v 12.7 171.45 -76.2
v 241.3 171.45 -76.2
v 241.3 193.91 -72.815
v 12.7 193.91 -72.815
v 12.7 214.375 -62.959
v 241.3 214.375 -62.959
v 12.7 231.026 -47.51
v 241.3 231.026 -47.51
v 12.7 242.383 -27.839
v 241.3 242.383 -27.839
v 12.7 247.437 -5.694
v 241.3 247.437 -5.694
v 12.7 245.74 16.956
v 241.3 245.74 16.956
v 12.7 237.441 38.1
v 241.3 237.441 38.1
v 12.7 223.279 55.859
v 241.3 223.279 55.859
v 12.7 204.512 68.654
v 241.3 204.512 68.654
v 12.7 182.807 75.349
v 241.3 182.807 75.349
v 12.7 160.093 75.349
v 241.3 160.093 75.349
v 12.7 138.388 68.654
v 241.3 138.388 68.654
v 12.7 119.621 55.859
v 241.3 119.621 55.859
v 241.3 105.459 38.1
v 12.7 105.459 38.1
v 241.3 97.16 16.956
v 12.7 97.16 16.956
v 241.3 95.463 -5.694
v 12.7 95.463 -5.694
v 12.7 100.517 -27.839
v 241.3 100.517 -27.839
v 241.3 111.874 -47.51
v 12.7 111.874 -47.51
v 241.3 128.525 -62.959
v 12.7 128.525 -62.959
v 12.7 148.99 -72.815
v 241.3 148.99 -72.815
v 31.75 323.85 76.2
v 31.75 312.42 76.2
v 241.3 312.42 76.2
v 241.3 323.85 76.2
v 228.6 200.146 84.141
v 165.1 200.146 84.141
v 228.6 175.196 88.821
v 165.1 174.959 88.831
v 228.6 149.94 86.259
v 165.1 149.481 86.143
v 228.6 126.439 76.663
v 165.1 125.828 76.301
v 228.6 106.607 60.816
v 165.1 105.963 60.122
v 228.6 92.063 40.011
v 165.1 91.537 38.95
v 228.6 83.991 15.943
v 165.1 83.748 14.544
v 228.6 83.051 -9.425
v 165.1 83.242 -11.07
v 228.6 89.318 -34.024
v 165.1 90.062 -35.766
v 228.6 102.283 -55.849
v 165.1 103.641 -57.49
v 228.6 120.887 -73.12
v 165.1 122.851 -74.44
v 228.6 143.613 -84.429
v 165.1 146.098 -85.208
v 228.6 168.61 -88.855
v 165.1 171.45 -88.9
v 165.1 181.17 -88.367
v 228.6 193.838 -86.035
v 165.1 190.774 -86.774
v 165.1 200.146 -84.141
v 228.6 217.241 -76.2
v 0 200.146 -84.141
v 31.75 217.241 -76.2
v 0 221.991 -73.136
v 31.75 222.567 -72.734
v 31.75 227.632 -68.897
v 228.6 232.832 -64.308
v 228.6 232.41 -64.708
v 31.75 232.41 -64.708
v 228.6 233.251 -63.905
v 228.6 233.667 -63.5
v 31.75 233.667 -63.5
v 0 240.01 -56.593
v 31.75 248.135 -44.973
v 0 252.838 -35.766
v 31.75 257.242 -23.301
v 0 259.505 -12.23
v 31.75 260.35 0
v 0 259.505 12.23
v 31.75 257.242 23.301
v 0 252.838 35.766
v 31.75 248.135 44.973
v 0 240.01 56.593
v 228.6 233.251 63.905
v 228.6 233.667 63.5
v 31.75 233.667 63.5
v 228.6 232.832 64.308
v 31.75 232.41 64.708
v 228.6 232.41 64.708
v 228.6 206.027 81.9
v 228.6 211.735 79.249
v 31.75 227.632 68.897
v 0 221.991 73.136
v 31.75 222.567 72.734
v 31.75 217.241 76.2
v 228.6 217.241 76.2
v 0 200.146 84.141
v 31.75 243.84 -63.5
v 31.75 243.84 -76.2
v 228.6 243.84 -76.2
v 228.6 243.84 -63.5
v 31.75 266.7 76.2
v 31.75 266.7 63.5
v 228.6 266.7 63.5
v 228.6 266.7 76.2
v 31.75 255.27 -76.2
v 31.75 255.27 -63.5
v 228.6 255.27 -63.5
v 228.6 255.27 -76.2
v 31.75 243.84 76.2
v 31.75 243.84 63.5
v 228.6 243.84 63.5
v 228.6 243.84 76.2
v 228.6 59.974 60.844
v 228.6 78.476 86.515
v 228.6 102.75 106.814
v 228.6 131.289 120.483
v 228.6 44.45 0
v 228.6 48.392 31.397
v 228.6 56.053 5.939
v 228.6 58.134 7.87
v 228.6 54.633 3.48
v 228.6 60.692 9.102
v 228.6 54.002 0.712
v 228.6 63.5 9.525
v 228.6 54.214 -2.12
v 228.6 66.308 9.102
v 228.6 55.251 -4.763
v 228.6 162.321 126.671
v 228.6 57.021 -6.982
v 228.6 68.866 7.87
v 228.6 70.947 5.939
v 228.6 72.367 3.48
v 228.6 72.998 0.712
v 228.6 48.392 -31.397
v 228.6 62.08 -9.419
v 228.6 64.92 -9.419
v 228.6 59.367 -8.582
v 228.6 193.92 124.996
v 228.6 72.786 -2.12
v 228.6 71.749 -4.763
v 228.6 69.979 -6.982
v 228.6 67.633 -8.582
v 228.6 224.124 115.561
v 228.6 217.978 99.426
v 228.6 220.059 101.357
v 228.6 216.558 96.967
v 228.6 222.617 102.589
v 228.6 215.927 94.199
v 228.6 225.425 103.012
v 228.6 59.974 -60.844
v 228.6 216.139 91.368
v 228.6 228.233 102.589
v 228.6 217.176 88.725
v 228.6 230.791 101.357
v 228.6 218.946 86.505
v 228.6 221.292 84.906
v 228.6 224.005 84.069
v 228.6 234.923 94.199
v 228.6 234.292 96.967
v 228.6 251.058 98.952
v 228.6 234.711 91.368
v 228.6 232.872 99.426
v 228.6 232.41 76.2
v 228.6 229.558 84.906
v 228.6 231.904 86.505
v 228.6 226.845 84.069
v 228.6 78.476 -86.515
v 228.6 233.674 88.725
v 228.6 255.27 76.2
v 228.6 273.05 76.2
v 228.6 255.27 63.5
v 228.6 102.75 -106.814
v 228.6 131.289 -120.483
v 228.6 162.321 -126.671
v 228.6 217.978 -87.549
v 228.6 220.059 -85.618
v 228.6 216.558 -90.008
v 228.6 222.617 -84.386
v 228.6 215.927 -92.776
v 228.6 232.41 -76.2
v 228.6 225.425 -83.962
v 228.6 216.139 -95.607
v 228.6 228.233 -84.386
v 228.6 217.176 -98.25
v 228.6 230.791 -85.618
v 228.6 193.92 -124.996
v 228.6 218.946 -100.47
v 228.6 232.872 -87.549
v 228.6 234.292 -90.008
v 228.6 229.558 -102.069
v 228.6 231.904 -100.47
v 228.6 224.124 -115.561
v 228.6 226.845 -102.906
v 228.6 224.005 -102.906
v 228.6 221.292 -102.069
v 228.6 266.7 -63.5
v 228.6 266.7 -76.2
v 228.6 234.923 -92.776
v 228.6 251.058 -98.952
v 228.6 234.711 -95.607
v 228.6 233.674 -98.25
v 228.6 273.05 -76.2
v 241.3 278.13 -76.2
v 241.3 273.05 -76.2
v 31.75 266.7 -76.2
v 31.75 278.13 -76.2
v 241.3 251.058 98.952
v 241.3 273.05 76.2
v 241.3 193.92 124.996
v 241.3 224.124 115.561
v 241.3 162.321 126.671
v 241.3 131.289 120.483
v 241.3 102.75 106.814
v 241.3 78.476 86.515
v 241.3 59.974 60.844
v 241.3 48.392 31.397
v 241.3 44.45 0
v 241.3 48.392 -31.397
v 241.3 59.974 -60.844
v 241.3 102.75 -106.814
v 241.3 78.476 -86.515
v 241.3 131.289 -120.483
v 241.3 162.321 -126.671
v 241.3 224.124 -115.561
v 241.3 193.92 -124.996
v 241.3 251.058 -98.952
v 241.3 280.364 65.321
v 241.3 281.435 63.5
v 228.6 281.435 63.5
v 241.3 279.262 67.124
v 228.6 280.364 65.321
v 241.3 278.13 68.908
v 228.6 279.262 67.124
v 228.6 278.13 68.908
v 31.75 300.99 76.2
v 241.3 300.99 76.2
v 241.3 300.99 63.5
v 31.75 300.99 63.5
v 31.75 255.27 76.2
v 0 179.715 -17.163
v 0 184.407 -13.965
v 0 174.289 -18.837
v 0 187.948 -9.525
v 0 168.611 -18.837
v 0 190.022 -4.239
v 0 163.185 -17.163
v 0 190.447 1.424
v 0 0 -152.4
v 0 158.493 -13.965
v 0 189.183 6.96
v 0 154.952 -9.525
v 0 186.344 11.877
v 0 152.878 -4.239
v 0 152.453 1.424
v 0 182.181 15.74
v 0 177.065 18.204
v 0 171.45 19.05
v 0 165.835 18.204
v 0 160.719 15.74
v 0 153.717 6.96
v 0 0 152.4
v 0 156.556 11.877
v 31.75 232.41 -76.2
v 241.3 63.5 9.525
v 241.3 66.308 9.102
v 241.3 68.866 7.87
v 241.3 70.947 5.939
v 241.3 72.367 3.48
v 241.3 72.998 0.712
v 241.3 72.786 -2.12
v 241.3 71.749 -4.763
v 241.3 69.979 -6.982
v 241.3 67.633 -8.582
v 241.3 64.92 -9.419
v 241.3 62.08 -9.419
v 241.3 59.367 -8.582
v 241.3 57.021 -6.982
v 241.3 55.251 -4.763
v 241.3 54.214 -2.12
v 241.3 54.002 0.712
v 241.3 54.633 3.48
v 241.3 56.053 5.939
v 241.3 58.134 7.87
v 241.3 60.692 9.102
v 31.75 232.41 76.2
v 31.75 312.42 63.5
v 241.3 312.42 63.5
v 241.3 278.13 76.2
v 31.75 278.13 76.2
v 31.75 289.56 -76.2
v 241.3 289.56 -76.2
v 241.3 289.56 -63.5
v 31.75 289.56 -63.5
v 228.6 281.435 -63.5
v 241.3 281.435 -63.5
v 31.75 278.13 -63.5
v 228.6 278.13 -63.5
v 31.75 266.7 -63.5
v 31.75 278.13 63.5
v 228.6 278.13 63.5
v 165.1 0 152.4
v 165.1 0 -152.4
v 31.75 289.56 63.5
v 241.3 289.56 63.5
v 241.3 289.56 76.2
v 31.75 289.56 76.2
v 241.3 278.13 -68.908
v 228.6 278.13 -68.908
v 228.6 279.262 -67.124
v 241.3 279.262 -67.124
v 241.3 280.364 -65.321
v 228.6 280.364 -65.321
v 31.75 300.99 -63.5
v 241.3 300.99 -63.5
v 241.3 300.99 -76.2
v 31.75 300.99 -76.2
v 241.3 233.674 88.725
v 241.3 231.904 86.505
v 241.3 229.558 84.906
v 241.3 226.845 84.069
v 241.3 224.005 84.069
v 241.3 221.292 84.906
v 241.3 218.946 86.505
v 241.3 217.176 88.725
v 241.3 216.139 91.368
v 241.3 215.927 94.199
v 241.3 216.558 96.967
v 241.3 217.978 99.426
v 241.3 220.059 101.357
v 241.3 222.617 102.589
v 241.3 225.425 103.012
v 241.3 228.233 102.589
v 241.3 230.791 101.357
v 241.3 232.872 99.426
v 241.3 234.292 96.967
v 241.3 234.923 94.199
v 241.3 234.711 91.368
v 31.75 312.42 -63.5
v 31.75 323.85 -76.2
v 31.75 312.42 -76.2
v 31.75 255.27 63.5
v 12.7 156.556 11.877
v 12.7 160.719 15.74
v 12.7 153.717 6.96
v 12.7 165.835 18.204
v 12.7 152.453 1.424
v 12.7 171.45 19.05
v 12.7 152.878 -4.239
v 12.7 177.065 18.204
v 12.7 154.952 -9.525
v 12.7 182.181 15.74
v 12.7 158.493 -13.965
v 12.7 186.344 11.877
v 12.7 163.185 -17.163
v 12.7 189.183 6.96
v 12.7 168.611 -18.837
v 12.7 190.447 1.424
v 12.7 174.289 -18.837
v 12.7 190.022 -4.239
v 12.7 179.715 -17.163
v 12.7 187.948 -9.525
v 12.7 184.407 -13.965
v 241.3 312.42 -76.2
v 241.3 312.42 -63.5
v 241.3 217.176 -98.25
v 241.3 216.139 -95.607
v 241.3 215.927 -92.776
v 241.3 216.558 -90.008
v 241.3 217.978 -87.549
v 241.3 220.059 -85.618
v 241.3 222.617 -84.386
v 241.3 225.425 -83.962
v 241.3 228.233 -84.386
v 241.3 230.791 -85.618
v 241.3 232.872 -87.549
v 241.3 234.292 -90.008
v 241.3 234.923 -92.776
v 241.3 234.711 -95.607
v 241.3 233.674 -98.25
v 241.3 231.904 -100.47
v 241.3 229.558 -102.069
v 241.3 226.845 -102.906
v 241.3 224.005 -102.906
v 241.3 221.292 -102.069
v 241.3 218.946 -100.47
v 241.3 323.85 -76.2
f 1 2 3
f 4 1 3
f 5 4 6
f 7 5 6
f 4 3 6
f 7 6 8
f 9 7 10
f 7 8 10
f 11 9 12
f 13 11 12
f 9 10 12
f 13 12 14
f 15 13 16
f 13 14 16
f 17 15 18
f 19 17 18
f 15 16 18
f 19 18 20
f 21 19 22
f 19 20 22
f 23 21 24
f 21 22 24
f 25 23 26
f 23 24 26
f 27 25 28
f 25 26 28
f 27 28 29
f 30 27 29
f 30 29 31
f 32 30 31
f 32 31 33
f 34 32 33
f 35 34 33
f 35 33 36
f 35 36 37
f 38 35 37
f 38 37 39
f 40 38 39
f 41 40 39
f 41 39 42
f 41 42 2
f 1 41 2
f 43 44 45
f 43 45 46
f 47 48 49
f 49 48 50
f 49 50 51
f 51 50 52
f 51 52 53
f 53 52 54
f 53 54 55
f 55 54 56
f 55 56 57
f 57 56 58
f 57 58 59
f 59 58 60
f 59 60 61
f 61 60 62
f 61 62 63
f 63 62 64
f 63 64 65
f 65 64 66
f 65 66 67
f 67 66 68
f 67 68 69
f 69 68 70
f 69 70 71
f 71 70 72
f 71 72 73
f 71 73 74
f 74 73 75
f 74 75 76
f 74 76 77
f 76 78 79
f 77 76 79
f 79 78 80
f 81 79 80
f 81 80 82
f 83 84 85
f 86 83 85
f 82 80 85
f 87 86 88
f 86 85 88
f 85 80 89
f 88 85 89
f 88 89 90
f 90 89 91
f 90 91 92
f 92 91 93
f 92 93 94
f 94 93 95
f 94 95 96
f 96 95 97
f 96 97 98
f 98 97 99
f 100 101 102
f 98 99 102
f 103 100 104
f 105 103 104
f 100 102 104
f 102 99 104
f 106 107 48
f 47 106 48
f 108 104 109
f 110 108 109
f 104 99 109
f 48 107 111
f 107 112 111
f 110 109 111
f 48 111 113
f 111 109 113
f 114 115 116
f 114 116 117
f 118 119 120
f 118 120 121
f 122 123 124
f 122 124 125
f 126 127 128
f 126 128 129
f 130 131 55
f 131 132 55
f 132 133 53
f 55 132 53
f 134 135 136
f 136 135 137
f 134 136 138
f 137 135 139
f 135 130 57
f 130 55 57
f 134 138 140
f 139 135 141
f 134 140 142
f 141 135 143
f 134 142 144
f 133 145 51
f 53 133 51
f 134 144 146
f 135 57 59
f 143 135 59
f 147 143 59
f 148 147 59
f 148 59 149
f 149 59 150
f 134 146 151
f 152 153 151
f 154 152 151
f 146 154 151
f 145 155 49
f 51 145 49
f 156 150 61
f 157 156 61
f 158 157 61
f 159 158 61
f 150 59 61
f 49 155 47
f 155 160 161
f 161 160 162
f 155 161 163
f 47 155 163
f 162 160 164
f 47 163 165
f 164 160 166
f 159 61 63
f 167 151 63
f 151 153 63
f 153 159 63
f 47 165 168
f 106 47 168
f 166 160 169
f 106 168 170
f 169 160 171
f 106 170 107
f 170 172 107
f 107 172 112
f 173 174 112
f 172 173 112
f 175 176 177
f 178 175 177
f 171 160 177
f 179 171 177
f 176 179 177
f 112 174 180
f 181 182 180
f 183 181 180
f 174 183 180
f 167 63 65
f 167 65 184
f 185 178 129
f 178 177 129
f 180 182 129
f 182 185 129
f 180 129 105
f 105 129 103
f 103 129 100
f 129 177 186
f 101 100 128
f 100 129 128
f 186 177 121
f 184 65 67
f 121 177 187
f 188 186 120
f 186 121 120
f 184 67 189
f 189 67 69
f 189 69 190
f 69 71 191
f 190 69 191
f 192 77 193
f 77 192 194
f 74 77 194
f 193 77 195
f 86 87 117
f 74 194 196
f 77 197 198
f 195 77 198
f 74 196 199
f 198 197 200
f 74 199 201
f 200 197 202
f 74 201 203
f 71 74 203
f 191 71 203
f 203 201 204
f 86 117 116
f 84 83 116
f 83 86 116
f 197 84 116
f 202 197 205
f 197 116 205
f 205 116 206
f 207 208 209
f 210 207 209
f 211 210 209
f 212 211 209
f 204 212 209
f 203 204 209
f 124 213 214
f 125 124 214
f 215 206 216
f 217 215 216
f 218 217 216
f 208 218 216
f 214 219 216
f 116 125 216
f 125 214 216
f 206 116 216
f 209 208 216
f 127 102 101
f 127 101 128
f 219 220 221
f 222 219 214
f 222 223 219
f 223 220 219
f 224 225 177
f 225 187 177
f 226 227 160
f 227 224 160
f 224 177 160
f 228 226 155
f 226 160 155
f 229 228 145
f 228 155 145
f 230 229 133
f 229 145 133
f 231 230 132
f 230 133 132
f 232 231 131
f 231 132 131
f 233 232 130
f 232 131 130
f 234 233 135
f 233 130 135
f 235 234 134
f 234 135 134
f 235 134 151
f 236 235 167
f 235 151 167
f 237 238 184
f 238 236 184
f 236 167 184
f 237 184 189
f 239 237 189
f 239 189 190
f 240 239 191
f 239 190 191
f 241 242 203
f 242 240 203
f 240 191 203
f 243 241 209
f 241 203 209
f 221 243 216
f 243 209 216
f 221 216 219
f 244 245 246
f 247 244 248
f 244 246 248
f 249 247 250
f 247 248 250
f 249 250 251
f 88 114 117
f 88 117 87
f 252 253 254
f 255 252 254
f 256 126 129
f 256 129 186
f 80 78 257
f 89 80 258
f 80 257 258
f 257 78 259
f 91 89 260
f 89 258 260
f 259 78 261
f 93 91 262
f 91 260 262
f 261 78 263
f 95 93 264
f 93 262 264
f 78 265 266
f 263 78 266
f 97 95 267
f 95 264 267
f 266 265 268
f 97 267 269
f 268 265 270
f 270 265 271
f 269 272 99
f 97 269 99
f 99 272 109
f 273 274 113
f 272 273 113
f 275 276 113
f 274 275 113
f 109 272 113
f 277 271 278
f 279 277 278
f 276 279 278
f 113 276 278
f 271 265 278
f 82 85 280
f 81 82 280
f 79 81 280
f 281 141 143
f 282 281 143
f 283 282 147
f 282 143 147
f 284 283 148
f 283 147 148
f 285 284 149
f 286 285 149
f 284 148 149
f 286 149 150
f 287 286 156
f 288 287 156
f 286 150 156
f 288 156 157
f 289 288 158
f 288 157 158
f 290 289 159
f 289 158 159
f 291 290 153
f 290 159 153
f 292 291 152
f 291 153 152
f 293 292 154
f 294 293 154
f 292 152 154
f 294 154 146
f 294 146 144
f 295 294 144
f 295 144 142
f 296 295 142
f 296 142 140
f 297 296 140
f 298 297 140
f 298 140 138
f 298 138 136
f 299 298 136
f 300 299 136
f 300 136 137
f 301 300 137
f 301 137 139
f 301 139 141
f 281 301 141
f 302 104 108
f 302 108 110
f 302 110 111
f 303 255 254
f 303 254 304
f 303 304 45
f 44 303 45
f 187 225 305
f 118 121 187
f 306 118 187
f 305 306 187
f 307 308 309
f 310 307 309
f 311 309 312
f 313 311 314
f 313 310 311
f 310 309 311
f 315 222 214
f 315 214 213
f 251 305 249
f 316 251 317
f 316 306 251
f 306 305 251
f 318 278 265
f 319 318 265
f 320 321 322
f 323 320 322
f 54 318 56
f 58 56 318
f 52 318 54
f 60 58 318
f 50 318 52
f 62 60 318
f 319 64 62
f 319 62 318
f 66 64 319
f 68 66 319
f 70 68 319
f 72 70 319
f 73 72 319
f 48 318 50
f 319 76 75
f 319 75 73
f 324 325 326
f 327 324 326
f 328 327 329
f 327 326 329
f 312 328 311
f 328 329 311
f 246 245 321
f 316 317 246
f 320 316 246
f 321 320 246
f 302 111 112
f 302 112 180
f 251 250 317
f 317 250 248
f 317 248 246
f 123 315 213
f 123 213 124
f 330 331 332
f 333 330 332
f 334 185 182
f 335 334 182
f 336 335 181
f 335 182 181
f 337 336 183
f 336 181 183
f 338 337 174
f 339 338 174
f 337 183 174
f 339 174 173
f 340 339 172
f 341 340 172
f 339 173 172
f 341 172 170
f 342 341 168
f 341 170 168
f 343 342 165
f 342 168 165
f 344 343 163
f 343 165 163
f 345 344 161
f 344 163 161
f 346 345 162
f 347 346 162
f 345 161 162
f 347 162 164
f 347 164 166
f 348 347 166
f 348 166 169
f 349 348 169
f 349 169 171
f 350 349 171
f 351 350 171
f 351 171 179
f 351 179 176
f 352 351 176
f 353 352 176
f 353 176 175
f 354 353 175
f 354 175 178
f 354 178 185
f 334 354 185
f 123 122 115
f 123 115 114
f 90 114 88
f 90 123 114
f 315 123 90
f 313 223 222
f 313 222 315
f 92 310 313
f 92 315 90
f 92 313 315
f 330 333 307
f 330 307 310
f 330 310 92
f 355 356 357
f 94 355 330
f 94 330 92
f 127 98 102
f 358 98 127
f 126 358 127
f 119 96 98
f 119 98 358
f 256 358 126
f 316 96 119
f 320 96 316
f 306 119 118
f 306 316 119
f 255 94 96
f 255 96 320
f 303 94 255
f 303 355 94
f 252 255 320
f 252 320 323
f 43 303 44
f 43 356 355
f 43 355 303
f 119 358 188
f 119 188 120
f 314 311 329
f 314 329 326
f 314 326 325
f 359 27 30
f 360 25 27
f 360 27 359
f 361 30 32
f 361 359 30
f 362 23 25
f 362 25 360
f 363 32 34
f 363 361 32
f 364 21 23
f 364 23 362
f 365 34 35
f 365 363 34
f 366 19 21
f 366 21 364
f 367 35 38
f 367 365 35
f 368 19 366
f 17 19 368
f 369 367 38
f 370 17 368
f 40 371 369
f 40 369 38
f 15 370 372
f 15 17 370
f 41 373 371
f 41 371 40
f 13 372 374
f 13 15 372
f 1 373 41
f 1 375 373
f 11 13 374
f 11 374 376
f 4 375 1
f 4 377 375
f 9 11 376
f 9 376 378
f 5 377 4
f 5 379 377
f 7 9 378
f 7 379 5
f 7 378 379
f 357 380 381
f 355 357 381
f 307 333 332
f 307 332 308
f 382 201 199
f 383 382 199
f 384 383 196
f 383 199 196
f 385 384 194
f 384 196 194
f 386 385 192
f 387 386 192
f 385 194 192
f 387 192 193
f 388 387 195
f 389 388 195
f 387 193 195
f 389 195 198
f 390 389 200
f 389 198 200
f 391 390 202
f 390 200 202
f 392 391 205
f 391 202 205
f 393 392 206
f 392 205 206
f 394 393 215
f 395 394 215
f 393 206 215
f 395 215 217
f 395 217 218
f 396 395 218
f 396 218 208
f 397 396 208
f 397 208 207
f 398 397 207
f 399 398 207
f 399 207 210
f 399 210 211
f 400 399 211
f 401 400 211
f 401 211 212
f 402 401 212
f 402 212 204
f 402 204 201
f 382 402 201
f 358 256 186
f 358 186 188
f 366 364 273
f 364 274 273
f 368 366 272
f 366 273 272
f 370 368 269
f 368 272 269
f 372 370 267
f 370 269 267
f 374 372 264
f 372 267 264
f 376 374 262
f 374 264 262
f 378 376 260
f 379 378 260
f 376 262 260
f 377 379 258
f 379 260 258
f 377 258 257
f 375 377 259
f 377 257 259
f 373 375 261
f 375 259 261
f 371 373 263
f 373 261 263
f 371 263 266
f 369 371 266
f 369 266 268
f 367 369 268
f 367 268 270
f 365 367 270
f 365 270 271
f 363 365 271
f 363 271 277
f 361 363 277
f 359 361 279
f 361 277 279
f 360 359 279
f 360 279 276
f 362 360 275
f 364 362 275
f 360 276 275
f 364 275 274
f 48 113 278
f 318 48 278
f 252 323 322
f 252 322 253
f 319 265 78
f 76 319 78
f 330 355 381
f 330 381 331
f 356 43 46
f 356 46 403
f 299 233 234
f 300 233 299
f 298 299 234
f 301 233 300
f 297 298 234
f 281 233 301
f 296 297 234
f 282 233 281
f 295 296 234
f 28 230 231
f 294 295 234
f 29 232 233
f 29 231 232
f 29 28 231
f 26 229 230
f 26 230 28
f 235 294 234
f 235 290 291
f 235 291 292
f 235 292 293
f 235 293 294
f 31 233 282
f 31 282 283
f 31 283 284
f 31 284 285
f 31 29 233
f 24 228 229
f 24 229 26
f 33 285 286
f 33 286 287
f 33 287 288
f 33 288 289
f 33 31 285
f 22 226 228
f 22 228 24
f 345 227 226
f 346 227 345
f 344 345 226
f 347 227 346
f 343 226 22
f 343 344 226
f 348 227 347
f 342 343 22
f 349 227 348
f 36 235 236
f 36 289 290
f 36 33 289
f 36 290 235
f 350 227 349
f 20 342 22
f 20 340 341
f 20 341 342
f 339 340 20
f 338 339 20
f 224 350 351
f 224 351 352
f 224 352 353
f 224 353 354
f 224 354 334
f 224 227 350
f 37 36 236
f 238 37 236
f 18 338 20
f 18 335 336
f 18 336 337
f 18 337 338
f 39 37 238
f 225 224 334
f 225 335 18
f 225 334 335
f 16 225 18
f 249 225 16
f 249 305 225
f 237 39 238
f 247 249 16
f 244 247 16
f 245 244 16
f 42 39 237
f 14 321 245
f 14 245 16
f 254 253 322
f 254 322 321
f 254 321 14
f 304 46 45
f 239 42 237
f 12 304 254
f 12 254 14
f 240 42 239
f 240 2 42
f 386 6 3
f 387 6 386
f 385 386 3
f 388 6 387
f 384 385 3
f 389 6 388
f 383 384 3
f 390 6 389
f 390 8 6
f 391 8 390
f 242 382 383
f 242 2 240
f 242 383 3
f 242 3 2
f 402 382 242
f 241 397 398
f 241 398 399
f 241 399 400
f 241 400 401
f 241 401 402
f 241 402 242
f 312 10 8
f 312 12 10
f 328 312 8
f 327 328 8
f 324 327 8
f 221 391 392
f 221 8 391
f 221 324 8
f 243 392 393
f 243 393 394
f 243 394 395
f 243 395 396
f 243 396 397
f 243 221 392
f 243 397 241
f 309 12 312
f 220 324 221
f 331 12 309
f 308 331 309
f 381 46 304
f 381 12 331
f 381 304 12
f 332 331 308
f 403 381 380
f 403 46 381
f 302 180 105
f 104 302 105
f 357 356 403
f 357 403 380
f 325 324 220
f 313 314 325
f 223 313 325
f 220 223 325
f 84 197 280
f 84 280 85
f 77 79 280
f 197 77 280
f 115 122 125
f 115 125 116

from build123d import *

# Parameters (mm, degrees)
BOSS_EXTRUDE1_DEPTH                                 = 165.1
SKETCH1_3_R                                         = 88.9
BOSS_EXTRUDE2_DEPTH                                 = 228.6
SKETCH2_R                                           = 127
BOSS_EXTRUDE3_DEPTH                                 = 12.7
BOSS_EXTRUDE4_START                                 = -209.55
BOSS_EXTRUDE4_DEPTH                                 = 209.55
CBORE_FOR_00_BINDING_HEAD_MACHINE_SCREW_D           = 38.1
CBORE_FOR_00_BINDING_HEAD_MACHINE_SCREW_CBORE_D     = 152.4
CBORE_FOR_00_BINDING_HEAD_MACHINE_SCREW_CBORE_DEPTH = 228.6
F_97_0_75_DIAMETER_HOLE1_D                          = 19.05
F_97_0_75_DIAMETER_HOLE1_DEPTH                      = 12.7
CIRPATTERN1_COUNT                                   = 3


with BuildPart() as part:
    # Sketch1 → Boss-Extrude1 (new body)
    with BuildSketch(Plane(origin=(0, 0, 0), x_dir=(0, 0, -1), z_dir=(1, 0, 0))):
        with BuildLine():
            Line((-84.14126771, 200.145941668), (-152.4, 0))
            Line((-152.4, 0), (152.4, 0))
            Line((152.4, 0), (84.14126771, 200.145941668))
            ThreePointArc((84.14126771, 200.145941668), (87.702248259, 185.993921421), (88.9, 171.45))
            ThreePointArc((88.9, 171.45), (-14.543921421, 83.747751741), (-84.14126771, 200.145941668))
        make_face()
    extrude(amount=BOSS_EXTRUDE1_DEPTH)

    # Sketch1<3> → Boss-Extrude2 (add)
    with BuildSketch(Plane(origin=(0, 0, 0), x_dir=(0, 0, -1), z_dir=(1, 0, 0))):
        with Locations(Location((0, 171.45, 0), (0, 0, 161.168324383))):
            Circle(SKETCH1_3_R)
    extrude(amount=BOSS_EXTRUDE2_DEPTH)

    # Sketch2 → Boss-Extrude3 (add)
    with BuildSketch(Plane(origin=(228.6, 0, 0), x_dir=(0, 0, -1), z_dir=(1, 0, 0))):
        with Locations((0, 171.45)):
            Circle(SKETCH2_R)
    extrude(amount=BOSS_EXTRUDE3_DEPTH)

    # Sketch3 → Boss-Extrude4 (add)
    with BuildSketch(Plane(origin=(241.3, 0, 0), x_dir=(0, 0, -1), z_dir=(1, 0, 0)).offset(BOSS_EXTRUDE4_START)):
        with BuildLine():
            Line((-76.2, 217.240501198), (-76.2, 232.41))
            Line((-76.2, 232.41), (-64.707715151, 232.41))
            ThreePointArc((-64.707715151, 232.41), (-70.860951664, 225.133661661), (-76.2, 217.240501198))
        make_face()
        with BuildLine():
            Line((-63.5, 233.667039467), (-63.5, 243.84))
            Line((-63.5, 243.84), (-76.2, 243.84))
            Line((-76.2, 243.84), (-76.2, 255.27))
            Line((-76.2, 255.27), (-63.5, 255.27))
            Line((-63.5, 255.27), (-63.5, 266.7))
            Line((-63.5, 266.7), (-76.2, 266.7))
            Line((-76.2, 266.7), (-76.2, 278.13))
            Line((-76.2, 278.13), (-63.5, 278.13))
            Line((-63.5, 278.13), (-63.5, 289.56))
            Line((-63.5, 289.56), (-76.2, 289.56))
            Line((-76.2, 289.56), (-76.2, 300.99))
            Line((-76.2, 300.99), (-63.5, 300.99))
            Line((-63.5, 300.99), (-63.5, 312.42))
            Line((-63.5, 312.42), (-76.2, 312.42))
            Line((-76.2, 312.42), (-76.2, 323.85))
            Line((-76.2, 323.85), (76.2, 323.85))
            Line((76.2, 323.85), (76.2, 312.42))
            Line((76.2, 312.42), (63.5, 312.42))
            Line((63.5, 312.42), (63.5, 300.99))
            Line((63.5, 300.99), (76.2, 300.99))
            Line((76.2, 300.99), (76.2, 289.56))
            Line((76.2, 289.56), (63.5, 289.56))
            Line((63.5, 289.56), (63.5, 278.13))
            Line((63.5, 278.13), (76.2, 278.13))
            Line((76.2, 278.13), (76.2, 266.7))
            Line((76.2, 266.7), (63.5, 266.7))
            Line((63.5, 266.7), (63.5, 255.27))
            Line((63.5, 255.27), (76.2, 255.27))
            Line((76.2, 255.27), (76.2, 243.84))
            Line((76.2, 243.84), (63.5, 243.84))
            Line((63.5, 243.84), (63.5, 233.667039467))
            ThreePointArc((63.5, 233.667039467), (0, 260.35), (-63.5, 233.667039467))
        make_face()
        with BuildLine():
            Line((76.2, 217.240501198), (76.2, 232.41))
            Line((76.2, 232.41), (64.707715151, 232.41))
            ThreePointArc((64.707715151, 232.41), (70.860951664, 225.133661661), (76.2, 217.240501198))
        make_face()
    extrude(amount=BOSS_EXTRUDE4_DEPTH)

    # CBORE for #00 Binding Head Machine Screw1 (through all)
    with Locations(Plane(origin=(241.3, 0, 0), x_dir=(0, 0, -1), z_dir=(1, 0, 0))):
        with Locations((0, 171.45)):
            CounterBoreHole(CBORE_FOR_00_BINDING_HEAD_MACHINE_SCREW_D / 2, CBORE_FOR_00_BINDING_HEAD_MACHINE_SCREW_CBORE_D / 2, CBORE_FOR_00_BINDING_HEAD_MACHINE_SCREW_CBORE_DEPTH)

    # #97 (0.75) Diameter Hole1
    with Locations(Plane(origin=(241.3, 0, 0), x_dir=(0, 0, -1), z_dir=(1, 0, 0))):
        with Locations((0, 63.5)):
            f_97_0_75_diameter_hole1 = Hole(F_97_0_75_DIAMETER_HOLE1_D / 2, depth=F_97_0_75_DIAMETER_HOLE1_DEPTH)

    # CirPattern1: #97 (0.75) Diameter Hole1 ×3 about axis
    cirpattern1_axis = Axis((0, 171.45, 0), (1, 0, 0))
    for i in range(1, CIRPATTERN1_COUNT):
        add(f_97_0_75_diameter_hole1.rotate(cirpattern1_axis, i * 360 / CIRPATTERN1_COUNT), mode=Mode.SUBTRACT)


solid = part.part
